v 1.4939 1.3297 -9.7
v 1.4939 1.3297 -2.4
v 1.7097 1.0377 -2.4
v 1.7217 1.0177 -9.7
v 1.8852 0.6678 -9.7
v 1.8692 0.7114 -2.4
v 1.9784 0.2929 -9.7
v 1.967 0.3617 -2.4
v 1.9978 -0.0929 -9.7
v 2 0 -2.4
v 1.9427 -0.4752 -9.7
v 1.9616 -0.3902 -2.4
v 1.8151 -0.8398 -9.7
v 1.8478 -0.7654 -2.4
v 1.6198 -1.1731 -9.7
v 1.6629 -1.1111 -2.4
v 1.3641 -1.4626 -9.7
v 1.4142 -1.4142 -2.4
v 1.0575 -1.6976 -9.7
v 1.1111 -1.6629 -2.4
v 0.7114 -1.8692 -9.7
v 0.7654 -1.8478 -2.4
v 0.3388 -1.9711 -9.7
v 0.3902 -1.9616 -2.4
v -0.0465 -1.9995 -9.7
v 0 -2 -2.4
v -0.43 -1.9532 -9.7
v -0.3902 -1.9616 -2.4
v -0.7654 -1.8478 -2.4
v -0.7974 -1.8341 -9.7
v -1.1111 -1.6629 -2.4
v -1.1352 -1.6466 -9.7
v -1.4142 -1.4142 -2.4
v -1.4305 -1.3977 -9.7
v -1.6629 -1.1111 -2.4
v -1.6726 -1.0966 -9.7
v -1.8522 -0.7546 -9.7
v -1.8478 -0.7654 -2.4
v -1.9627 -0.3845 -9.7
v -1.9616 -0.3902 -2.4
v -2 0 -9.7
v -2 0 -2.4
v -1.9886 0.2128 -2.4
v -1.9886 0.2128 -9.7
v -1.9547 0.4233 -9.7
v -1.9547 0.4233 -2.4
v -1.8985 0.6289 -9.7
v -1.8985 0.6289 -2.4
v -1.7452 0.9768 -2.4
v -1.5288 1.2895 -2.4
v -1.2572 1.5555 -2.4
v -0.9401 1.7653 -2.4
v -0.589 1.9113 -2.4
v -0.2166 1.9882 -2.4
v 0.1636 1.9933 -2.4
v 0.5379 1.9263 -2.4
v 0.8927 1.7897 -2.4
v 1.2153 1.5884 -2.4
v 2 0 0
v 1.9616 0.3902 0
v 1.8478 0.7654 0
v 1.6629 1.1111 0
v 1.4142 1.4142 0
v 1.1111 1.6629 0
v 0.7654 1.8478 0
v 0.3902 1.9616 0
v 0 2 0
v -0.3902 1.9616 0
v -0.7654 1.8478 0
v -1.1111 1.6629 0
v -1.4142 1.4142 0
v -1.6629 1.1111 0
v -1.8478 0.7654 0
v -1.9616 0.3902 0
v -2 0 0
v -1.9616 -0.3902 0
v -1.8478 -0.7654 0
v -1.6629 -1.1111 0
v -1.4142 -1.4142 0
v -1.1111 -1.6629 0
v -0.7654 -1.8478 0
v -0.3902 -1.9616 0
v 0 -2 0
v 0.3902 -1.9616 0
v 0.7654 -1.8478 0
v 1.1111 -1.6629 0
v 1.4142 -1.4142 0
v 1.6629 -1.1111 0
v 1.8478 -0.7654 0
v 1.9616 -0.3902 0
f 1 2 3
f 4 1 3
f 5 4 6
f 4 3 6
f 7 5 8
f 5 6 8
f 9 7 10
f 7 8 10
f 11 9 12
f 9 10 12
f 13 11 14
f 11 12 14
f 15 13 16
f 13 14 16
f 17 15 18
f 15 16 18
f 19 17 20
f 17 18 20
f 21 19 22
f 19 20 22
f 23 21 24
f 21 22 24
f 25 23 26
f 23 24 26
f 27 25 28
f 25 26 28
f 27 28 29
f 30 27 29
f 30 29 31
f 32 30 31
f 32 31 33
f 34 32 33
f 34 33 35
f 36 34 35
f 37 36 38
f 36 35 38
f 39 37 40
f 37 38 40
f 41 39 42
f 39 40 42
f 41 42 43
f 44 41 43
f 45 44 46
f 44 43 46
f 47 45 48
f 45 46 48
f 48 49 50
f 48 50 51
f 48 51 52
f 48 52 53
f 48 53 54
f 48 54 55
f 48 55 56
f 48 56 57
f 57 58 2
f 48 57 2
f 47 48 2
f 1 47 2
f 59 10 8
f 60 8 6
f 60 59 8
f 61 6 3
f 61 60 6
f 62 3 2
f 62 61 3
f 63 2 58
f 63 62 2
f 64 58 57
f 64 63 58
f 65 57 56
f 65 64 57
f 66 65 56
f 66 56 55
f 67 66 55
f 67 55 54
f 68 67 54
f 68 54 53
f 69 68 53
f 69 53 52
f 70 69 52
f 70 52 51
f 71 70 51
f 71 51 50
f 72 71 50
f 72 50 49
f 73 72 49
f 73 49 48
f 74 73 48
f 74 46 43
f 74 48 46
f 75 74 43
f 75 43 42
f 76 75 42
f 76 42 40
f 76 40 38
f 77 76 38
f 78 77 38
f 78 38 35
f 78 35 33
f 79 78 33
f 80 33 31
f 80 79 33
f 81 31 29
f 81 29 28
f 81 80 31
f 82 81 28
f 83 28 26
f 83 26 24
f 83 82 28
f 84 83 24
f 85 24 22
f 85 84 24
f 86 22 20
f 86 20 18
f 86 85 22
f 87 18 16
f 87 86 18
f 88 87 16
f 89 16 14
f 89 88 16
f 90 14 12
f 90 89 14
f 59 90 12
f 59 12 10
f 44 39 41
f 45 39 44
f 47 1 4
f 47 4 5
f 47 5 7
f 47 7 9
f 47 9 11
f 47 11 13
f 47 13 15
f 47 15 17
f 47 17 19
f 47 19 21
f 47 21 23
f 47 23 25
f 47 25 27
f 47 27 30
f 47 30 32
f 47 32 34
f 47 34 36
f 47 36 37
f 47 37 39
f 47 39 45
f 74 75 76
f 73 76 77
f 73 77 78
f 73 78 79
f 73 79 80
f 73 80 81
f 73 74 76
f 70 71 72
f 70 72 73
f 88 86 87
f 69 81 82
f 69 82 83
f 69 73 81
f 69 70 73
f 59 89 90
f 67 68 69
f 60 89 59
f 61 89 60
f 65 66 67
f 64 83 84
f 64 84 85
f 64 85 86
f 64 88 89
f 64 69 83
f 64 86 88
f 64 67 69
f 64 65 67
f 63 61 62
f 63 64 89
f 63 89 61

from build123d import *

# Parameters (mm, degrees)
SKETCH_1_R      = 2
EXTRUDE_1_DEPTH = 2.4
EXTRUDE_2_DEPTH = 7.3


with BuildPart() as part:
    # 草图1 → 凸台-拉伸1 (new body)
    with BuildSketch(Plane.XY):
        Circle(SKETCH_1_R)
    extrude(amount=-EXTRUDE_1_DEPTH)

    # 草图2 → 凸台-拉伸2 (add)
    with BuildSketch(Plane(origin=(0, 0, -2.4), x_dir=(-1, 0, 0), z_dir=(0, 0, -1))):
        with BuildLine():
            ThreePointArc((2, 0), (1.974474181, 0.318514847), (1.898548292, 0.628899341))
            Line((1.898548292, 0.628899341), (-1.493916952, 1.329741381))
            ThreePointArc((-1.493916952, 1.329741381), (-0.711395142, -1.869202223), (2, 0))
        make_face()
    extrude(amount=EXTRUDE_2_DEPTH)


solid = part.part
